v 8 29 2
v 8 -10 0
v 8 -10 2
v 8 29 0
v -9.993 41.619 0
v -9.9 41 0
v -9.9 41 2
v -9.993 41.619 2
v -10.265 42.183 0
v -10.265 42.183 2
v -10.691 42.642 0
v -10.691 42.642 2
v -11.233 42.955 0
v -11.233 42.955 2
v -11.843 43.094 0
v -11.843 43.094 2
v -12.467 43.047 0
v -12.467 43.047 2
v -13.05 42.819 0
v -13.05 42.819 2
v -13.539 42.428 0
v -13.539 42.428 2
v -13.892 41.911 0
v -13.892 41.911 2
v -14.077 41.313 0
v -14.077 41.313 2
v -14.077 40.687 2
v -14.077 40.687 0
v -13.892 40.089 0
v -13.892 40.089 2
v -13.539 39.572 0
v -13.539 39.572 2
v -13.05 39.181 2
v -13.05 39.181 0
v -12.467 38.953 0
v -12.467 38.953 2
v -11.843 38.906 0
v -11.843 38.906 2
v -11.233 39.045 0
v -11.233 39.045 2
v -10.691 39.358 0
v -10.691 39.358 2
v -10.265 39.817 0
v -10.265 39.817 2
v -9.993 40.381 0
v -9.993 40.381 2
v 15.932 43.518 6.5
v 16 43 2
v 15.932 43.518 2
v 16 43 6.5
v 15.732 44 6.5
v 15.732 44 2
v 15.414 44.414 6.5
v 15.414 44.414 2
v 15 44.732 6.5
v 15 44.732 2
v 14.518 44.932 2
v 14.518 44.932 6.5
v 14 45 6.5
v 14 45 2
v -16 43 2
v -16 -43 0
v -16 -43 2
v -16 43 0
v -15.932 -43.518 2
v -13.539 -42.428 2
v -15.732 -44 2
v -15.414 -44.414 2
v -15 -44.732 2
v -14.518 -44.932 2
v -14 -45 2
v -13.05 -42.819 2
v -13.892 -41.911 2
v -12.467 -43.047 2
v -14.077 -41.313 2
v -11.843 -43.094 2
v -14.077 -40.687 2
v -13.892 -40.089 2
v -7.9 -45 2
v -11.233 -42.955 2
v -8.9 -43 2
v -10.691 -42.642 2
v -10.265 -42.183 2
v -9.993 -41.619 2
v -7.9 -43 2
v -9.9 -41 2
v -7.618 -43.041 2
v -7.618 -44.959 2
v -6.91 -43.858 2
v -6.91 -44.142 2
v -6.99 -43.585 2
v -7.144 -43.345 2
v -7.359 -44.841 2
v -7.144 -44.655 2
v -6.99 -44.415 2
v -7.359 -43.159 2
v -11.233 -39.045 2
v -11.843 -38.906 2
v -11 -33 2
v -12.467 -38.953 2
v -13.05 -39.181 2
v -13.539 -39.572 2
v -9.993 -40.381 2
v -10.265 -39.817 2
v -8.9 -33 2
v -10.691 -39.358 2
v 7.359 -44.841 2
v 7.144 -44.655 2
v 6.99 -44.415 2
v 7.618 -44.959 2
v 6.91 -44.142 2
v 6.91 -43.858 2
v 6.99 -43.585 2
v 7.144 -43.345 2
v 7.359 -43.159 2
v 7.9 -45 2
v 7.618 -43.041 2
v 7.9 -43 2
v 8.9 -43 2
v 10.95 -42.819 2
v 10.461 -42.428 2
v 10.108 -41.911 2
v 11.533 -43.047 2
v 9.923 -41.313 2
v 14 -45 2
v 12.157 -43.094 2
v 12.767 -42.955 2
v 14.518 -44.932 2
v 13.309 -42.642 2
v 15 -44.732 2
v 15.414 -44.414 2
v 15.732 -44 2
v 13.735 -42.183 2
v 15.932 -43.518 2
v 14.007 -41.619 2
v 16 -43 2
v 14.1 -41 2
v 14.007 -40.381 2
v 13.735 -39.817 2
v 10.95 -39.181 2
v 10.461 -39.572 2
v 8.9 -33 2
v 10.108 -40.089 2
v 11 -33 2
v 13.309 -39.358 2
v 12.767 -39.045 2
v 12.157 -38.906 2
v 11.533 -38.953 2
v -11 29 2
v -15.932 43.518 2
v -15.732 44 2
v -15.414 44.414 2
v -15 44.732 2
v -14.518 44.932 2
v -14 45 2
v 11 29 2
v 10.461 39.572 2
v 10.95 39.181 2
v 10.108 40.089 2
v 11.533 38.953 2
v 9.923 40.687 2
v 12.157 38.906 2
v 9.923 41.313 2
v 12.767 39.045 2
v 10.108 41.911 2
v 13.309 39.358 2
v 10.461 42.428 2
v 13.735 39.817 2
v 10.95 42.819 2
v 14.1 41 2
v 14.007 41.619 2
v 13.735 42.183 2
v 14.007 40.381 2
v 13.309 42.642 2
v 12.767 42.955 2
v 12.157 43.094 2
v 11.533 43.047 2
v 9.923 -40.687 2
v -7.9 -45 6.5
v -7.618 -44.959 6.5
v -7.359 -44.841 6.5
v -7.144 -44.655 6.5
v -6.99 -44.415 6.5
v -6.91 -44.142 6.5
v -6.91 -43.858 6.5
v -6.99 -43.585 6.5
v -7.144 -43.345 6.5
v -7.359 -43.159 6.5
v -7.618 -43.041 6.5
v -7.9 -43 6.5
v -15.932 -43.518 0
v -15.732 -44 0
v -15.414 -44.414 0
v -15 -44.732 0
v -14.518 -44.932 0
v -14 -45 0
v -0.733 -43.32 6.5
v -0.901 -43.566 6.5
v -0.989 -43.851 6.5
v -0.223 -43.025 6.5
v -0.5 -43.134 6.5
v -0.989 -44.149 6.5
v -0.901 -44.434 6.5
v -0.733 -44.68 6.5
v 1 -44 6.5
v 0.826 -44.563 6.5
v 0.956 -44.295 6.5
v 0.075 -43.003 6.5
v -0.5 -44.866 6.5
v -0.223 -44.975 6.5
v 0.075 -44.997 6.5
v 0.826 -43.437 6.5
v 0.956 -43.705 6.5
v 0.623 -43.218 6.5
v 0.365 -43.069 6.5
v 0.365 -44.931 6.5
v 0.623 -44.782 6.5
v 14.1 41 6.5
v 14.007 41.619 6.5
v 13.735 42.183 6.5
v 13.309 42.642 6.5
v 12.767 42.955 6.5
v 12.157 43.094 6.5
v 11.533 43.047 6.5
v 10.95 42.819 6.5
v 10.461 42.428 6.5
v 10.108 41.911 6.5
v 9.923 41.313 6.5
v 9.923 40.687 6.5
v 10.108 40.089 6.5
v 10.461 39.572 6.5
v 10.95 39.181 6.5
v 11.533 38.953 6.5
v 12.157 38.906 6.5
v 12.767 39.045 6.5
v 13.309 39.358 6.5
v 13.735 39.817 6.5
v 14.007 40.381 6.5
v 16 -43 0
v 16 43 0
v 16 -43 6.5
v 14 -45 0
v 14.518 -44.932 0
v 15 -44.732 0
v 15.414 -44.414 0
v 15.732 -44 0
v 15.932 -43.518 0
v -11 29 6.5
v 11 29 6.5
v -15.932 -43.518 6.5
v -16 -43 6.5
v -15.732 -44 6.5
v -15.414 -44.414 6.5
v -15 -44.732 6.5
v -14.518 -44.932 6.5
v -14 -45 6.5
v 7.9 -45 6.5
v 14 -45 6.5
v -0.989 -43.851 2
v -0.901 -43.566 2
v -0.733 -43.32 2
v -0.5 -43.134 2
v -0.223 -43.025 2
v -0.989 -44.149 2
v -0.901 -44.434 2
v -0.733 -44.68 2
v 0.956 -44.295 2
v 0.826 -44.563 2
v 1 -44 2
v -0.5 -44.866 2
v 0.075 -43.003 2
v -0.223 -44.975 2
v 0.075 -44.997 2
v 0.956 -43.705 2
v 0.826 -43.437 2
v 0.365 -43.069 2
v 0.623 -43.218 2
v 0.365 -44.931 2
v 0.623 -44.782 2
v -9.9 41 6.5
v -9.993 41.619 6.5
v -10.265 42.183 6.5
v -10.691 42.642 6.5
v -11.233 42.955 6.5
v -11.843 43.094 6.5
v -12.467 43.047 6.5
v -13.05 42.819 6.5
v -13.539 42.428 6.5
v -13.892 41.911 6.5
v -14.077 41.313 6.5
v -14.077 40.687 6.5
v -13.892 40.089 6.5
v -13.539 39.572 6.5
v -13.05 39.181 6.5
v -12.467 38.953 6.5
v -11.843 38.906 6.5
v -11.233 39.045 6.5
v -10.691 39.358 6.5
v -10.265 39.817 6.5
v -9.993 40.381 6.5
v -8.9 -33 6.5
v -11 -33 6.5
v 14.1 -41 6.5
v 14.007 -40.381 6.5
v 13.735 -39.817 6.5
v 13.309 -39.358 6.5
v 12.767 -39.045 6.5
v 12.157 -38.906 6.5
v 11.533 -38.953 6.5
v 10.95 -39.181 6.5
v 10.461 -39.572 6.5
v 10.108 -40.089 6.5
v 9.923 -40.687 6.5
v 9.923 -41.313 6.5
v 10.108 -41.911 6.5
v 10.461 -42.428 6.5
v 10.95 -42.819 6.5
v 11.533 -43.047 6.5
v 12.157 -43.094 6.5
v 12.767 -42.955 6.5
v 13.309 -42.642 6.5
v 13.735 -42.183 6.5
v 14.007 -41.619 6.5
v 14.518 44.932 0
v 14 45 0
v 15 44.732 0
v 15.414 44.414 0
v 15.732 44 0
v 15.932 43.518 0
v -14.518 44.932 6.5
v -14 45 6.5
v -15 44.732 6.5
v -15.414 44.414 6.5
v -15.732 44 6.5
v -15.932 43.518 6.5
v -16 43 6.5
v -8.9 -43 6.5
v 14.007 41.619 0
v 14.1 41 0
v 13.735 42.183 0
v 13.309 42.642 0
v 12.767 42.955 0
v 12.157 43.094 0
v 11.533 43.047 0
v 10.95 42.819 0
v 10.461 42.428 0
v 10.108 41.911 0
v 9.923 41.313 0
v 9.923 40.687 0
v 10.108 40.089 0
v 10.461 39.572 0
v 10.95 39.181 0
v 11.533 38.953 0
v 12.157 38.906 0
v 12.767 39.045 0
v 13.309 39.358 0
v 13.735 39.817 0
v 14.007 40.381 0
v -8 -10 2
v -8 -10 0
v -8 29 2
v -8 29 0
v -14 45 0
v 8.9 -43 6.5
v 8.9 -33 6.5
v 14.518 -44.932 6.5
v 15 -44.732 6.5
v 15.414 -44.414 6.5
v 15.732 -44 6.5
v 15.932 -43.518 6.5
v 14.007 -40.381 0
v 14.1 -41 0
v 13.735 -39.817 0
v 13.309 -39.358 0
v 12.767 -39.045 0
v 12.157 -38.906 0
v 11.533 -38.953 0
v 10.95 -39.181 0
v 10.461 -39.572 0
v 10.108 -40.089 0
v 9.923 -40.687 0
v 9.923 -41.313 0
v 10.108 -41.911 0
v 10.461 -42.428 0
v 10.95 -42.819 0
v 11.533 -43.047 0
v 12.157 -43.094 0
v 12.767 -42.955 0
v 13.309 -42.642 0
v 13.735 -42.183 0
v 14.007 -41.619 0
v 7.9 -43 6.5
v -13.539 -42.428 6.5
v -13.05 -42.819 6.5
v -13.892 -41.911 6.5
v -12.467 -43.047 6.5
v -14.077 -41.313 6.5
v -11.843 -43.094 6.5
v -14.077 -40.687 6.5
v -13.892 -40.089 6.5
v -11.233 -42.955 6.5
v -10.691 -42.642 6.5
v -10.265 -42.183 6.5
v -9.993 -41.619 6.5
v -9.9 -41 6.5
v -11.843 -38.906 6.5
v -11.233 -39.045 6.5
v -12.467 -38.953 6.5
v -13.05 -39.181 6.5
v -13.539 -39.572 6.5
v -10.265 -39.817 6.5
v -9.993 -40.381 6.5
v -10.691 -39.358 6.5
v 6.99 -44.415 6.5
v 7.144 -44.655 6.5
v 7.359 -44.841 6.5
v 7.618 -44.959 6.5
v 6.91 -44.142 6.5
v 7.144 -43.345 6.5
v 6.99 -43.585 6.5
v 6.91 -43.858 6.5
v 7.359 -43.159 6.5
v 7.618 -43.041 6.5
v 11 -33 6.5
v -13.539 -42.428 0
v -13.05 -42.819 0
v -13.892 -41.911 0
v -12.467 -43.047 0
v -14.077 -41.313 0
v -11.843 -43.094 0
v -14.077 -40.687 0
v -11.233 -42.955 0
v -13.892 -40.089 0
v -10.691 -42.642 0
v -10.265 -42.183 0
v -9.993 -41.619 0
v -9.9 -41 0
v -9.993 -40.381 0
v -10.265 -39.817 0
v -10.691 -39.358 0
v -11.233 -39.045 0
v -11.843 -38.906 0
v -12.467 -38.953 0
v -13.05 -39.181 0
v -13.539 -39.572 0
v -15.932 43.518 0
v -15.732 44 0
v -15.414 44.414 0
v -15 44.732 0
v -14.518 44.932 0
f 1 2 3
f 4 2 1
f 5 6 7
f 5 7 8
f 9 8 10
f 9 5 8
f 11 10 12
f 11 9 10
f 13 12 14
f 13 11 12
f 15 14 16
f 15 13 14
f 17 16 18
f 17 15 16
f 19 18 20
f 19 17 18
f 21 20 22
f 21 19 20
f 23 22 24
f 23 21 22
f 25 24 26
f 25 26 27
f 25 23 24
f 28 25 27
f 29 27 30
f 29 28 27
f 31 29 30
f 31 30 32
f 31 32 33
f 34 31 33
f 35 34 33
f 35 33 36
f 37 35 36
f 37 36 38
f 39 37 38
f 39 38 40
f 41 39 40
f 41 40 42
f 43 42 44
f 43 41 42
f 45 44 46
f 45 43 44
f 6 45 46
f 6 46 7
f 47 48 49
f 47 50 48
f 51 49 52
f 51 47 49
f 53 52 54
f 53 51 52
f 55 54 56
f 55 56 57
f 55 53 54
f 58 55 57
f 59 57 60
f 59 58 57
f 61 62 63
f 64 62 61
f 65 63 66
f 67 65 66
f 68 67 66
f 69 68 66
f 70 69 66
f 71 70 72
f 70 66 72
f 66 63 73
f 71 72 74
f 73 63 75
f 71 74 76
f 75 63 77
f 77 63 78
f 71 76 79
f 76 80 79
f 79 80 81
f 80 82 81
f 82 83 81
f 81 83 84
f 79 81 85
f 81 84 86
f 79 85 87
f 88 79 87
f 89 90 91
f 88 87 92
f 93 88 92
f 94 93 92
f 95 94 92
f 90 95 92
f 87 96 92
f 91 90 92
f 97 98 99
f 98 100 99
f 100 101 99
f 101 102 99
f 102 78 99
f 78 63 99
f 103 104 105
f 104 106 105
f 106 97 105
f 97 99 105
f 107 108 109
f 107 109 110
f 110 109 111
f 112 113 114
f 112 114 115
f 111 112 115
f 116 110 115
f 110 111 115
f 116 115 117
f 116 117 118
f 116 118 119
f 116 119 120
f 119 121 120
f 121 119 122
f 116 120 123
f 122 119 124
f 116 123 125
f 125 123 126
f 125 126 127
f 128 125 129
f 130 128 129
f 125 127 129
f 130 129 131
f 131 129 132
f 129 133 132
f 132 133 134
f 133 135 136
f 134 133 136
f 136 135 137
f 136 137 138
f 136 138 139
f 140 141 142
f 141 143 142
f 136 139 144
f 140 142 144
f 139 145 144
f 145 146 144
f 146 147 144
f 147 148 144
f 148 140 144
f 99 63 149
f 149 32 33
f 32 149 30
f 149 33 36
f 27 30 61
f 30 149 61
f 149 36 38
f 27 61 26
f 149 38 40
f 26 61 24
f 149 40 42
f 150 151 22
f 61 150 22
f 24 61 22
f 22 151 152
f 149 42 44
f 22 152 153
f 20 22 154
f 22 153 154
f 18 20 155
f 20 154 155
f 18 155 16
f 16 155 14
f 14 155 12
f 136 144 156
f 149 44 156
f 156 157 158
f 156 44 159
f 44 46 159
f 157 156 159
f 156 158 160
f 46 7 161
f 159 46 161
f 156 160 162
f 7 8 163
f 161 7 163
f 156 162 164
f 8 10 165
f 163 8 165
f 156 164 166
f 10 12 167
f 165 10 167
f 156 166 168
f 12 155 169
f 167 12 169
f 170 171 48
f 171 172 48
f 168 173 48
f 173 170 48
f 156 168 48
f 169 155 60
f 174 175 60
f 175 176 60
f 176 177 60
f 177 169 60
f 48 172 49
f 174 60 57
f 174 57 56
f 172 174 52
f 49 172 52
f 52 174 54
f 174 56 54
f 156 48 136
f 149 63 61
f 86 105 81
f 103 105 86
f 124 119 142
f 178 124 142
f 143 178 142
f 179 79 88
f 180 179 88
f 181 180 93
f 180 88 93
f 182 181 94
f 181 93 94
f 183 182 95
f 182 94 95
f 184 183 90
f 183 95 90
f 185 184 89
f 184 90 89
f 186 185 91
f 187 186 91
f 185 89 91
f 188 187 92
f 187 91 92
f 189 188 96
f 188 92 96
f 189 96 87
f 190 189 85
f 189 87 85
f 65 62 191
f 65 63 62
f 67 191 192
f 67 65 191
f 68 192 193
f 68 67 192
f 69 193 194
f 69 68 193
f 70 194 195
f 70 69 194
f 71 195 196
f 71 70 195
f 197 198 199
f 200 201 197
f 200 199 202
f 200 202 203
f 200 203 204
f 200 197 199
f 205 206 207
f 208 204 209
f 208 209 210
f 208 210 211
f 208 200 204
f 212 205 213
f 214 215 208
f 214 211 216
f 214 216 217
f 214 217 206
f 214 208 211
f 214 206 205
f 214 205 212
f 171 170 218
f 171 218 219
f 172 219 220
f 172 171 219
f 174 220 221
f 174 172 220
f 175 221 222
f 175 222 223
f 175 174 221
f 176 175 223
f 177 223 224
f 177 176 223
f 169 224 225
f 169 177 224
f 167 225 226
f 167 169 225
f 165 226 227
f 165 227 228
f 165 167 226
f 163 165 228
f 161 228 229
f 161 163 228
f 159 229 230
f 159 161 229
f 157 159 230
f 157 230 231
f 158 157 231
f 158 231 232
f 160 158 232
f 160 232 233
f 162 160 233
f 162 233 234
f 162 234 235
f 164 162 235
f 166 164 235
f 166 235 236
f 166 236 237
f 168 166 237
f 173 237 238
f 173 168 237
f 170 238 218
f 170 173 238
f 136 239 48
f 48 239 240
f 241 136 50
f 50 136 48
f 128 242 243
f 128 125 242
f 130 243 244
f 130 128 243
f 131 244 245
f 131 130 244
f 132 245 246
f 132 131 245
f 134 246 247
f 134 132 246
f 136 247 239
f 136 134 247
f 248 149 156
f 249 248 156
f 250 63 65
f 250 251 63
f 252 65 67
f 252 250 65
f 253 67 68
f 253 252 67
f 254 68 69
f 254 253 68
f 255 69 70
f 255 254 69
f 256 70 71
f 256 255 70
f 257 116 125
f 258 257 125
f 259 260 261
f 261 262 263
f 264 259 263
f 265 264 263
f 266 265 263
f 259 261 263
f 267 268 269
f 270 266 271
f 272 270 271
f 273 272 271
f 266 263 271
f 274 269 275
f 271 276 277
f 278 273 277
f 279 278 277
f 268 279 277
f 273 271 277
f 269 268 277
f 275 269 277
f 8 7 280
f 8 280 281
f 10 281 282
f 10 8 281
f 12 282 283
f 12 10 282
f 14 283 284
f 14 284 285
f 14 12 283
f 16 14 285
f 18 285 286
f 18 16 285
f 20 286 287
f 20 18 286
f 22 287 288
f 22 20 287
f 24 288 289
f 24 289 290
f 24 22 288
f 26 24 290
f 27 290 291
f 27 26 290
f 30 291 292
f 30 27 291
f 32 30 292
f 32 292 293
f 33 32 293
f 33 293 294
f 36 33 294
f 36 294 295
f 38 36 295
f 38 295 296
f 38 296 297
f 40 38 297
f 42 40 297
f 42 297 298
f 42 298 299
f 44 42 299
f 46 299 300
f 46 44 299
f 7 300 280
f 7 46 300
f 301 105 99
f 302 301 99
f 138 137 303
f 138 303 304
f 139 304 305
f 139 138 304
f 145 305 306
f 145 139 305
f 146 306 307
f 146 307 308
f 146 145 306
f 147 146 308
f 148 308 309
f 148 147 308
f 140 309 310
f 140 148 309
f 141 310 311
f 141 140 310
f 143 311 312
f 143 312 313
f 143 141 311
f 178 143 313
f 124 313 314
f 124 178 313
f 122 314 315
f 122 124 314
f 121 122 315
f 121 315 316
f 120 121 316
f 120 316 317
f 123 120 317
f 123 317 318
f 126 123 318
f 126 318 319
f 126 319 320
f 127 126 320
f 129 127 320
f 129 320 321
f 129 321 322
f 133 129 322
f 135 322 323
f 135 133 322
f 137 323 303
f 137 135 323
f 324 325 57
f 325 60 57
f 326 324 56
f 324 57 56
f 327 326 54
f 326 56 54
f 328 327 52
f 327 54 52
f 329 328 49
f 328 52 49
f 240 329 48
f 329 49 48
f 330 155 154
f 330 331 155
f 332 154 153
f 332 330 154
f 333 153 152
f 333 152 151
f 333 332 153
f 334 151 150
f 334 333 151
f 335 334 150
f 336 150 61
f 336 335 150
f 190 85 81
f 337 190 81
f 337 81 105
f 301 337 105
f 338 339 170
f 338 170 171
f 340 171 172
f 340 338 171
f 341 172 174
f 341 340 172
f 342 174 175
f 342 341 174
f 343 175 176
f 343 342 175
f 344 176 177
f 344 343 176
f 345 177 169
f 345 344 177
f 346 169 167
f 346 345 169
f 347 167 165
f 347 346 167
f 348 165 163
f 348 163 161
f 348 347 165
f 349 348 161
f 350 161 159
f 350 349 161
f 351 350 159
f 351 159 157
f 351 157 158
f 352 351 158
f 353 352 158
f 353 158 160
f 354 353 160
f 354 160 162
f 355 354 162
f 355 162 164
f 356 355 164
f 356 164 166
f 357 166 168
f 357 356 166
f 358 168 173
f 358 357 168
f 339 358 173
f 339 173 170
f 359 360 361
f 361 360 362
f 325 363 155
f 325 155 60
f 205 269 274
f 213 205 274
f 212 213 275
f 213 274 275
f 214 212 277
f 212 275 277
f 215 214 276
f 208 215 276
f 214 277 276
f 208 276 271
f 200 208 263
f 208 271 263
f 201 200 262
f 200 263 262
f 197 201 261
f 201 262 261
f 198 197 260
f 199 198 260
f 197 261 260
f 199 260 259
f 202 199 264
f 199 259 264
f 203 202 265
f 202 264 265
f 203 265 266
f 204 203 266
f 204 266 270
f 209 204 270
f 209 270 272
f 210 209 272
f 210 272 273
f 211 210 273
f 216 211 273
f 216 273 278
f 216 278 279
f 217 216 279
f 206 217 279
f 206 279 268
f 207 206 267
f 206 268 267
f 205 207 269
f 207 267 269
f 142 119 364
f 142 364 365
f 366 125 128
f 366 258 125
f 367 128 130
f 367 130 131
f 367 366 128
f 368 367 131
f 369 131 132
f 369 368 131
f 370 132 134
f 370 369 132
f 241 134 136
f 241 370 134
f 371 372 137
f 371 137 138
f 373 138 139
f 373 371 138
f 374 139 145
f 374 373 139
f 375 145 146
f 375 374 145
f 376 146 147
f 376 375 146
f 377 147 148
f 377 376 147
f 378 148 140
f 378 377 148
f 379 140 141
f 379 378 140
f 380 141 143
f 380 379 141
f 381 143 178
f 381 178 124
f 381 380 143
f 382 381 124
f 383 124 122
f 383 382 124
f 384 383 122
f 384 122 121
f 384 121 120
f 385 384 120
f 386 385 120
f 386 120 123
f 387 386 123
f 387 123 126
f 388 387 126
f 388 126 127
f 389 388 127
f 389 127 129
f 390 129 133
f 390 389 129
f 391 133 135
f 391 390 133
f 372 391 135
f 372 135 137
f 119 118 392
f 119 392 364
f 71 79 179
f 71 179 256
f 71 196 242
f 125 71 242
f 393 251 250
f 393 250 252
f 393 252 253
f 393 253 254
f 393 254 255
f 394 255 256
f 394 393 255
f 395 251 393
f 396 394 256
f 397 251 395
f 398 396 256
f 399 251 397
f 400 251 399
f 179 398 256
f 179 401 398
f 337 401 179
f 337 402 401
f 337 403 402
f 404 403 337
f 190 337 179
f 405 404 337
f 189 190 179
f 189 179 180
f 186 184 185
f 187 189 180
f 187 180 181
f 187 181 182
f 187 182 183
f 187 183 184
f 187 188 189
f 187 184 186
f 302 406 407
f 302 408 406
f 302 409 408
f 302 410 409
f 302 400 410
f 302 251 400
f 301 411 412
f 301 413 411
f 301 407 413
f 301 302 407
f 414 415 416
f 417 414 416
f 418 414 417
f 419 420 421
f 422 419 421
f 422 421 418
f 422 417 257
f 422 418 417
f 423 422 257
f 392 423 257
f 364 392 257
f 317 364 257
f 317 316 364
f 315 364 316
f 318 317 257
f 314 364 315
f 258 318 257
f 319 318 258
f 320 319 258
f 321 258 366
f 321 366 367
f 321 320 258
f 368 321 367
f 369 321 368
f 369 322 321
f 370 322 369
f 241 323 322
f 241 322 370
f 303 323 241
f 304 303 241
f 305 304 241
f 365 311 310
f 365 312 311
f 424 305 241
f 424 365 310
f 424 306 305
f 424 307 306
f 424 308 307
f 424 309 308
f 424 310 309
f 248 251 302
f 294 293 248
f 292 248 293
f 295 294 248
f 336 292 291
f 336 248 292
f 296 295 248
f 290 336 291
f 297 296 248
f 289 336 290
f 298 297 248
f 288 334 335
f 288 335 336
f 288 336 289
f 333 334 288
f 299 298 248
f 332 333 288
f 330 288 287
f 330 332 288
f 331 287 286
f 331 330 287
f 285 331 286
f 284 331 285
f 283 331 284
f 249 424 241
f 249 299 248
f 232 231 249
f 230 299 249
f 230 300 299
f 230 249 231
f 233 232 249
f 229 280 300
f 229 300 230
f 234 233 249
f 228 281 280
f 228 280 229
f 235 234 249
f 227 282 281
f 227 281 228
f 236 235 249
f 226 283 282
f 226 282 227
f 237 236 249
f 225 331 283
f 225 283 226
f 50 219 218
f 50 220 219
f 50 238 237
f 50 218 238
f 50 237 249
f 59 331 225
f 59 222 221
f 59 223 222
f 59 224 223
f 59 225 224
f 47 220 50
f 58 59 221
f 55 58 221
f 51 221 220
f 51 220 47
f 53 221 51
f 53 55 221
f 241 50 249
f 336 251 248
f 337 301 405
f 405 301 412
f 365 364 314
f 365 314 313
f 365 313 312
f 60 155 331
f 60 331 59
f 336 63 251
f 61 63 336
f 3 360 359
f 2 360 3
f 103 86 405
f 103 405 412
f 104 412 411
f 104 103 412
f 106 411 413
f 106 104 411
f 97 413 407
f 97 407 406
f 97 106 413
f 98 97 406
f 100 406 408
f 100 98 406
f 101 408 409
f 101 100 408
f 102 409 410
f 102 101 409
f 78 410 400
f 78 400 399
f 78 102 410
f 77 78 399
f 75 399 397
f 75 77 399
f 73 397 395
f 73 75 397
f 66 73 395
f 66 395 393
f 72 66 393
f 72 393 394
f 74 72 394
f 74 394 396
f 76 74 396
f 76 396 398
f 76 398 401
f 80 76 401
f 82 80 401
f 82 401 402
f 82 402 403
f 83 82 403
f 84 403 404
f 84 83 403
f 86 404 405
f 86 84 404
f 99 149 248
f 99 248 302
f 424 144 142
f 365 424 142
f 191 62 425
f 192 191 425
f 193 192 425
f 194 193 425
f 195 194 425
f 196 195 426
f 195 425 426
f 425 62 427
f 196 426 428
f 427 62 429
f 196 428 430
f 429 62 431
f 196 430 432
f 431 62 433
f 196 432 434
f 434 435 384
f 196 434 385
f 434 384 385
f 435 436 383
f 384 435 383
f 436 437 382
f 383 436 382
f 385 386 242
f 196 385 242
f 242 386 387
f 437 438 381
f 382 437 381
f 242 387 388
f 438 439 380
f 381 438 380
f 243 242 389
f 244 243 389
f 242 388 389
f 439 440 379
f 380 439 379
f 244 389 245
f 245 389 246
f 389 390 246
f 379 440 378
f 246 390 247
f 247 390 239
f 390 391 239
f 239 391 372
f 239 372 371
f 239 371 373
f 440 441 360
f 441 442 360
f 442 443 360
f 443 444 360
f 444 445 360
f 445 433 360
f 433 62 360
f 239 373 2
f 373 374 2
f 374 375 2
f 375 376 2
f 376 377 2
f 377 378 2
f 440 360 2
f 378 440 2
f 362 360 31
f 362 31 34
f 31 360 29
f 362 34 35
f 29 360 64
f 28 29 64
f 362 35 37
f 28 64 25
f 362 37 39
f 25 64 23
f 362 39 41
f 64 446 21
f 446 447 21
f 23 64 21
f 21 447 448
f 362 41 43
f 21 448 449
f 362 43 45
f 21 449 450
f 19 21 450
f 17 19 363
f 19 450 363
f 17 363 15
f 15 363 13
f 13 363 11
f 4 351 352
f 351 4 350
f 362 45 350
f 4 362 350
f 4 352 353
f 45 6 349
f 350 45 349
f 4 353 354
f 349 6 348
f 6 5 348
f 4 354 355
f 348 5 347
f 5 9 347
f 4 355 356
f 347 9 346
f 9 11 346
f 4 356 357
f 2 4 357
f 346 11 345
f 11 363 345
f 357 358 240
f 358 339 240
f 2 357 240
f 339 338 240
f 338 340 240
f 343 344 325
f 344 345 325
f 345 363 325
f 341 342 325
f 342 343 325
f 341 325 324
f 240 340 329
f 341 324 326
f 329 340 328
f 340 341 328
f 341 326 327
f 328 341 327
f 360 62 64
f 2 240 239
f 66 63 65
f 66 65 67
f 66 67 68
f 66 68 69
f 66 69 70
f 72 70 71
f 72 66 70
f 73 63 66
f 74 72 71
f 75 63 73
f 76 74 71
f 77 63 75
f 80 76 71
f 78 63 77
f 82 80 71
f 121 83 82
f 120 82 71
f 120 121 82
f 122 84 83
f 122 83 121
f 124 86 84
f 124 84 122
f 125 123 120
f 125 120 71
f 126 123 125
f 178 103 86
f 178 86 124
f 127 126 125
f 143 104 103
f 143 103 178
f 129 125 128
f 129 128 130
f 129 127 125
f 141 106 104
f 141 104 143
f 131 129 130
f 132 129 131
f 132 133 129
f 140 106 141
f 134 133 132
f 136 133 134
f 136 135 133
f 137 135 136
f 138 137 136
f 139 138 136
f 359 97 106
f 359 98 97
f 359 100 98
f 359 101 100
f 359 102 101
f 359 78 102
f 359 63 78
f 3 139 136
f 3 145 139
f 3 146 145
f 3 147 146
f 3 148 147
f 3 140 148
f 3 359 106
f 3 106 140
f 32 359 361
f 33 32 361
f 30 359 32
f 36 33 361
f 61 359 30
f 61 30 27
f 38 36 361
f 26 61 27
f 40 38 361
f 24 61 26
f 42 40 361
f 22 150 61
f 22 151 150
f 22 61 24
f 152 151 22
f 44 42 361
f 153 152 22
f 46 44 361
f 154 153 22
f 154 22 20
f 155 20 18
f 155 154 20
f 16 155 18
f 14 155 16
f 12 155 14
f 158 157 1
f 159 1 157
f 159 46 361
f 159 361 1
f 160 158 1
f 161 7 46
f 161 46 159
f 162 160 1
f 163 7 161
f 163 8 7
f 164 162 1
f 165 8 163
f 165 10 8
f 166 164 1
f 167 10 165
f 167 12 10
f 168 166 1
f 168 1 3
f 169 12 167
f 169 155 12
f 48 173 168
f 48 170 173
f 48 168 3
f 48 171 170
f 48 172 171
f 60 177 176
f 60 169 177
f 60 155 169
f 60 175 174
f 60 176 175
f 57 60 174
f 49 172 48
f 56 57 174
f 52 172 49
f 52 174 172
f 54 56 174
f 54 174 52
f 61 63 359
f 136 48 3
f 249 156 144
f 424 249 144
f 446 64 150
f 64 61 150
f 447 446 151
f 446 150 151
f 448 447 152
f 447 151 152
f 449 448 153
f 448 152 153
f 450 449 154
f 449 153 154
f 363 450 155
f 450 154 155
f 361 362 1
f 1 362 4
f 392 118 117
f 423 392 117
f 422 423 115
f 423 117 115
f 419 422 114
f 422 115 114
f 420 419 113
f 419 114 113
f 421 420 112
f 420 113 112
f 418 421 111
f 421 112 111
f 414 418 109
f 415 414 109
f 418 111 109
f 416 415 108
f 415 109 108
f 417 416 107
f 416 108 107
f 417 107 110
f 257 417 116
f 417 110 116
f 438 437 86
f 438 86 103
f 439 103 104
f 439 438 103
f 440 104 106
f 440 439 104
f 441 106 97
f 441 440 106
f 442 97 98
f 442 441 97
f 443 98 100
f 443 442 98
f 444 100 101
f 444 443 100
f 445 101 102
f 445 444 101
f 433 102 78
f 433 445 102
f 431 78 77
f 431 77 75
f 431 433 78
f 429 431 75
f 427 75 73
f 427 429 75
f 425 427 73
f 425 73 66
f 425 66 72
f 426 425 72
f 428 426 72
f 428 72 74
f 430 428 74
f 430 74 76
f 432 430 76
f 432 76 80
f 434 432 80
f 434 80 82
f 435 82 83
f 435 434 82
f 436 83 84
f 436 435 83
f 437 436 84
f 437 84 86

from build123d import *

# Parameters (mm, degrees)
SKETCH_W         = 32
SKETCH_H         = 90
SKETCH_R         = 2.1
SKETCH_W_2       = 16
SKETCH_H_2       = 39
EXTRUDE_DEPTH    = 2
FILLET_R         = 2
SKETCH001_R      = 1
SKETCH001_R_2    = 2.1
EXTRUDE001_DEPTH = 4.5
FILLET001_R      = 2


with BuildPart() as fillet_body:
    # Sketch → Extrude (new body)
    with BuildSketch(Plane.XY):
        Rectangle(SKETCH_W, SKETCH_H)
        with Locations((-12, 41)):
            Circle(SKETCH_R, mode=Mode.SUBTRACT)
        with Locations((12, 41)):
            Circle(SKETCH_R, mode=Mode.SUBTRACT)
        with Locations((-12, -41)):
            Circle(SKETCH_R, mode=Mode.SUBTRACT)
        with Locations((12, -41)):
            Circle(SKETCH_R, mode=Mode.SUBTRACT)
        with Locations((0, 9.5)):
            Rectangle(SKETCH_W_2, SKETCH_H_2, mode=Mode.SUBTRACT)
    extrude(amount=EXTRUDE_DEPTH)

    # Fillet
    fillet_edges = [fillet_body.edges().sort_by_distance(p)[0] for p in [
        (-16, 45, 1),
        (16, 45, 1),
        (16, -45, 1),
        (-16, -45, 1),
    ]]
    fillet(fillet_edges, radius=FILLET_R)


with BuildPart() as fillet001:
    # Sketch001 (on Face14 of Extrude) → Extrude001 (new body)
    with BuildSketch(Plane.XY.offset(2)):
        with Locations((0, -44)):
            Circle(SKETCH001_R)
        with BuildLine():
            ThreePointArc((7.9, -43), (6.9, -44), (7.9, -45))
            Line((7.9, -45), (16, -45))
            Line((16, -45), (16, 45))
            Line((-16, 45), (16, 45))
            Line((-16, -45), (-16, 45))
            Line((-7.9, -45), (-16, -45))
            ThreePointArc((-7.9, -45), (-6.9, -44), (-7.9, -43))
            Line((-7.9, -43), (-8.9, -43))
            Line((-8.9, -43), (-8.9, -33))
            Line((-8.9, -33), (-11, -33))
            Line((-11, 29), (-11, -33))
            Line((-11, 29), (11, 29))
            Line((11, 29), (11, -33))
            Line((11, -33), (8.9, -33))
            Line((8.9, -43), (8.9, -33))
            Line((7.9, -43), (8.9, -43))
        make_face()
        with Locations((-12, -41)):
            Circle(SKETCH001_R_2, mode=Mode.SUBTRACT)
        with Locations((12, 41)):
            Circle(SKETCH001_R_2, mode=Mode.SUBTRACT)
        with Locations((12, -41)):
            Circle(SKETCH001_R_2, mode=Mode.SUBTRACT)
        with Locations((-12, 41)):
            Circle(SKETCH001_R_2, mode=Mode.SUBTRACT)
    extrude(amount=EXTRUDE001_DEPTH)

    # Fillet001
    fillet001_edges = [fillet001.edges().sort_by_distance(p)[0] for p in [
        (16, -45, 4.25),
        (16, 45, 4.25),
        (-16, 45, 4.25),
        (-16, -45, 4.25),
    ]]
    fillet(fillet001_edges, radius=FILLET001_R)


solid = Compound([fillet_body.part, fillet001.part])
